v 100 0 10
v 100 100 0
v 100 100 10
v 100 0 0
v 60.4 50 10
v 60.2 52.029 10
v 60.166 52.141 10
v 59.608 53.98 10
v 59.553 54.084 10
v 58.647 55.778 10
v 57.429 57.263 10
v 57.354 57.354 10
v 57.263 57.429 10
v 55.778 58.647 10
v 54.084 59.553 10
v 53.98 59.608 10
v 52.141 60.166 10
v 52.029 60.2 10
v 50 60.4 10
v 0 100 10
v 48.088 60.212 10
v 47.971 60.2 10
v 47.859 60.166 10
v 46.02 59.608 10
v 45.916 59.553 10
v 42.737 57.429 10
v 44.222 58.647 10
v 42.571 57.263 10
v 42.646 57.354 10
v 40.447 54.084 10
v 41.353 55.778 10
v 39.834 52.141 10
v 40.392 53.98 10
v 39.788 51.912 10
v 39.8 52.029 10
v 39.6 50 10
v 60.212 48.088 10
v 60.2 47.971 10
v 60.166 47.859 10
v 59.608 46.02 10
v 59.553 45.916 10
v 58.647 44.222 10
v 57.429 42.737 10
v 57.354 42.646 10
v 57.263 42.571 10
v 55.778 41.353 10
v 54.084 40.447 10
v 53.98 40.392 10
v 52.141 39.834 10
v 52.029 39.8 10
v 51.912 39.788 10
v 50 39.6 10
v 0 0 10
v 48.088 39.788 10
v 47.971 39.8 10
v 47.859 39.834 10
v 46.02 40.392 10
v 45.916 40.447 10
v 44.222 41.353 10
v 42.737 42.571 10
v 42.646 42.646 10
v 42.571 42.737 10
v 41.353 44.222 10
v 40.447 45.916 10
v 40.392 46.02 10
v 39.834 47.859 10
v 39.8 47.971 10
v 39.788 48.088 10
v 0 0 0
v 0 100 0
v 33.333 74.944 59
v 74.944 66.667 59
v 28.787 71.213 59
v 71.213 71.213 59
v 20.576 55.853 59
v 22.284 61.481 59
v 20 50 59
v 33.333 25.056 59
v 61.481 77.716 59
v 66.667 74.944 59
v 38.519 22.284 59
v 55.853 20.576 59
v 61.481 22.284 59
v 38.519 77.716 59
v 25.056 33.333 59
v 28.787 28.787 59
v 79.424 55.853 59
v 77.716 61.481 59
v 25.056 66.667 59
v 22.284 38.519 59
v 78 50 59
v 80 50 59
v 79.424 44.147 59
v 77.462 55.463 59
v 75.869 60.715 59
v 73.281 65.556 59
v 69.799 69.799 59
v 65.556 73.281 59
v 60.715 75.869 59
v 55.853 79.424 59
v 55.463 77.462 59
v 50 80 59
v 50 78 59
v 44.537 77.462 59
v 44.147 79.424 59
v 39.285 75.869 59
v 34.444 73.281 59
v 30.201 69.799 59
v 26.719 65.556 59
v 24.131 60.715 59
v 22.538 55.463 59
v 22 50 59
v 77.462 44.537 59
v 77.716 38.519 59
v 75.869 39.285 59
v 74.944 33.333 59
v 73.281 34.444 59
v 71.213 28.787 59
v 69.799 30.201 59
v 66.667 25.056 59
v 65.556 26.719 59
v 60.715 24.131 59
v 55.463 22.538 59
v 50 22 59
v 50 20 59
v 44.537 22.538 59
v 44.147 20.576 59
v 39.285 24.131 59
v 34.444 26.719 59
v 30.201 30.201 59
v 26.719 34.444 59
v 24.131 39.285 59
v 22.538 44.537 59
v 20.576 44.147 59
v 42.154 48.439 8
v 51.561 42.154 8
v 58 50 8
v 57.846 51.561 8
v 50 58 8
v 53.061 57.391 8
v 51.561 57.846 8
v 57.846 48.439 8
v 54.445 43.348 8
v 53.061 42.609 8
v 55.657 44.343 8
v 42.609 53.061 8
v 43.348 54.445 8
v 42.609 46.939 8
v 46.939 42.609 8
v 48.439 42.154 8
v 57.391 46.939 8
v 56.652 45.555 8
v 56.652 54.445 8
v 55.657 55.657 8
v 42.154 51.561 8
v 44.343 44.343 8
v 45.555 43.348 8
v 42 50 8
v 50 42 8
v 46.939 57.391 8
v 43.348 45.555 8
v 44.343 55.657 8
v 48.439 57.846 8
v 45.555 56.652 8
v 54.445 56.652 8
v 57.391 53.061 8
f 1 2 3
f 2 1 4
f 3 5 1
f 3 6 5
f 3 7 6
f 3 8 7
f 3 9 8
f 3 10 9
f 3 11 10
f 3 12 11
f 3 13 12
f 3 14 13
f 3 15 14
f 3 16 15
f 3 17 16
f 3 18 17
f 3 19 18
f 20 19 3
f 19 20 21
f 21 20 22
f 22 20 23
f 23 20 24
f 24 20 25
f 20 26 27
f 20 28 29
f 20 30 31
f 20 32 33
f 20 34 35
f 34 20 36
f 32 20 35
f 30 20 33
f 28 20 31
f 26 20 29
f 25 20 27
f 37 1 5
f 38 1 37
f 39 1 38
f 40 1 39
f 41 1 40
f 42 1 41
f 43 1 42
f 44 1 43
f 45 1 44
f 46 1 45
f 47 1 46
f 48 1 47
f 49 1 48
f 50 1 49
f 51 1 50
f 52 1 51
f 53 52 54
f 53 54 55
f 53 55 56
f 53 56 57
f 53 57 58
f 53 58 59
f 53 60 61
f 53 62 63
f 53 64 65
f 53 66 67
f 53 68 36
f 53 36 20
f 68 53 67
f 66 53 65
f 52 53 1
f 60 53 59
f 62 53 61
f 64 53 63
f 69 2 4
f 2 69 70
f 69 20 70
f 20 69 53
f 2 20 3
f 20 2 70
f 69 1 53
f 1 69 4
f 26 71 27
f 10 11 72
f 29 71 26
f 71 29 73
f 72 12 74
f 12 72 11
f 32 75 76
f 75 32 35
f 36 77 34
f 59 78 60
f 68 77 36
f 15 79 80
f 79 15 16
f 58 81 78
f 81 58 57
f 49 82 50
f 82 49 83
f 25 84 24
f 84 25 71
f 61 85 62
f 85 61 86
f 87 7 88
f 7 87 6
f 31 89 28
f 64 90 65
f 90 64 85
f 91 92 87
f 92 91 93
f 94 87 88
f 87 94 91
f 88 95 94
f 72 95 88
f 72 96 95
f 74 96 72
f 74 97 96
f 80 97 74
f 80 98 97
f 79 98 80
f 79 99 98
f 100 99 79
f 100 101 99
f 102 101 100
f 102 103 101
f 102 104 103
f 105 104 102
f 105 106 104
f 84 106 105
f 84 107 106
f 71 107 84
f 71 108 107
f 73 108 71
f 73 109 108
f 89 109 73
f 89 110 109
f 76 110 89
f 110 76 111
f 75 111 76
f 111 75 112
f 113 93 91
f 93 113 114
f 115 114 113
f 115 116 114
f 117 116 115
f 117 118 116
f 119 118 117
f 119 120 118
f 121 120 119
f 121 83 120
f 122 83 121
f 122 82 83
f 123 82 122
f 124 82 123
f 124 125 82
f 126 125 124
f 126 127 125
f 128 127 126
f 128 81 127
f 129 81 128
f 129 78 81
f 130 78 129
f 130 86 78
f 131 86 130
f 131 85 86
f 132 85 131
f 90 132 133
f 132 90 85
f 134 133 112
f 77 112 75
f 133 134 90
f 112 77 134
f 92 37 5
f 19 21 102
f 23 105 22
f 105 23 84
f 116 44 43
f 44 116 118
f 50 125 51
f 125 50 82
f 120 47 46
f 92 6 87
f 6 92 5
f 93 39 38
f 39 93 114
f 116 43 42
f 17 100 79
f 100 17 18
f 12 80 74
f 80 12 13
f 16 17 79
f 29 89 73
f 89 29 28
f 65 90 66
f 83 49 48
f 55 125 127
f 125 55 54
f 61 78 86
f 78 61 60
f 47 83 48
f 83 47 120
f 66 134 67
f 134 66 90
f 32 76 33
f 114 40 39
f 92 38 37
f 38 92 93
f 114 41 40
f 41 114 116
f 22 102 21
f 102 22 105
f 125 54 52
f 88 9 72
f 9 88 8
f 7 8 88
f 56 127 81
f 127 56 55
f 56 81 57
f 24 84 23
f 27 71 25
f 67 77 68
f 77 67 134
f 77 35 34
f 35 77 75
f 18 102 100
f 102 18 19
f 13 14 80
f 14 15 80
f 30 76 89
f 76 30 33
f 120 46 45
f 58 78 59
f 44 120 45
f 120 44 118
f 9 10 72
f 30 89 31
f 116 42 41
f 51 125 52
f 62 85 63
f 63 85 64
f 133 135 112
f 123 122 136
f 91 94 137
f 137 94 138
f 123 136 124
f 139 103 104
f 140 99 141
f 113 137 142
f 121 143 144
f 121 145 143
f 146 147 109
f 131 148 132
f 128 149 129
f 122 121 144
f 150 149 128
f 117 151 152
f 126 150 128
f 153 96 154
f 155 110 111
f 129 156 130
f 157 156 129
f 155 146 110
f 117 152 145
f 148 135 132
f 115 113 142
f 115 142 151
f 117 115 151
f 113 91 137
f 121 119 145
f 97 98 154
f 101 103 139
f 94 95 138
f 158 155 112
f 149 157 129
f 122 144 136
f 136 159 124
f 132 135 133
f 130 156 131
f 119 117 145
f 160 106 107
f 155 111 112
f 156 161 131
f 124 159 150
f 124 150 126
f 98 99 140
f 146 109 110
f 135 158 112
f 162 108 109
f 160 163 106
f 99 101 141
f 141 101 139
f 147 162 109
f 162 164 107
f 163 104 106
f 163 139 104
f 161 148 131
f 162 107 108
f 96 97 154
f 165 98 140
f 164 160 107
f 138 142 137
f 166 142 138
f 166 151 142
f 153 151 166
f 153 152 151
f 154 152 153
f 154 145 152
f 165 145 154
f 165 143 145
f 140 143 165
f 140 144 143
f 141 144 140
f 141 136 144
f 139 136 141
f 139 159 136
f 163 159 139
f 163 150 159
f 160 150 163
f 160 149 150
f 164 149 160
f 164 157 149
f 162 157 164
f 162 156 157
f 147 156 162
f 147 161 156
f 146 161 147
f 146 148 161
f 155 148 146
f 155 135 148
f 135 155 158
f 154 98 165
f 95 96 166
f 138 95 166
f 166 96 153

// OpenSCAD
$fn = 32;

// ----------------------------------------------------------------------
// Hopper: funnel with square flange
// ----------------------------------------------------------------------

// --- parameters (mm) ---
fl = 100;                 // flange side, X and Y
fl_t = 10;                // flange thickness
cone_h = 50;              // cone height above the flange
top_d = 60;               // cone mouth diameter
bot_d = 20;               // cone spout diameter
wall = 2;                 // cone wall thickness
fit_tol = 0.1;            // tolerance for press fits, mm
free_tol = 0.5;           // tolerance for clearance fits, mm

bore_d = bot_d - 2 * wall;  // spout bore diameter
total_h = fl_t + cone_h - 1;  // overall height

difference() {
  union() {
    cube([fl, fl, fl_t]);
    translate([fl / 2, fl / 2, fl_t - 1])
      cylinder(h = cone_h, d1 = bot_d, d2 = top_d);
  }
  translate([fl / 2, fl / 2, fl_t - 2])
    cylinder(h = cone_h + 1, d1 = bore_d, d2 = top_d - 2 * wall);
}
